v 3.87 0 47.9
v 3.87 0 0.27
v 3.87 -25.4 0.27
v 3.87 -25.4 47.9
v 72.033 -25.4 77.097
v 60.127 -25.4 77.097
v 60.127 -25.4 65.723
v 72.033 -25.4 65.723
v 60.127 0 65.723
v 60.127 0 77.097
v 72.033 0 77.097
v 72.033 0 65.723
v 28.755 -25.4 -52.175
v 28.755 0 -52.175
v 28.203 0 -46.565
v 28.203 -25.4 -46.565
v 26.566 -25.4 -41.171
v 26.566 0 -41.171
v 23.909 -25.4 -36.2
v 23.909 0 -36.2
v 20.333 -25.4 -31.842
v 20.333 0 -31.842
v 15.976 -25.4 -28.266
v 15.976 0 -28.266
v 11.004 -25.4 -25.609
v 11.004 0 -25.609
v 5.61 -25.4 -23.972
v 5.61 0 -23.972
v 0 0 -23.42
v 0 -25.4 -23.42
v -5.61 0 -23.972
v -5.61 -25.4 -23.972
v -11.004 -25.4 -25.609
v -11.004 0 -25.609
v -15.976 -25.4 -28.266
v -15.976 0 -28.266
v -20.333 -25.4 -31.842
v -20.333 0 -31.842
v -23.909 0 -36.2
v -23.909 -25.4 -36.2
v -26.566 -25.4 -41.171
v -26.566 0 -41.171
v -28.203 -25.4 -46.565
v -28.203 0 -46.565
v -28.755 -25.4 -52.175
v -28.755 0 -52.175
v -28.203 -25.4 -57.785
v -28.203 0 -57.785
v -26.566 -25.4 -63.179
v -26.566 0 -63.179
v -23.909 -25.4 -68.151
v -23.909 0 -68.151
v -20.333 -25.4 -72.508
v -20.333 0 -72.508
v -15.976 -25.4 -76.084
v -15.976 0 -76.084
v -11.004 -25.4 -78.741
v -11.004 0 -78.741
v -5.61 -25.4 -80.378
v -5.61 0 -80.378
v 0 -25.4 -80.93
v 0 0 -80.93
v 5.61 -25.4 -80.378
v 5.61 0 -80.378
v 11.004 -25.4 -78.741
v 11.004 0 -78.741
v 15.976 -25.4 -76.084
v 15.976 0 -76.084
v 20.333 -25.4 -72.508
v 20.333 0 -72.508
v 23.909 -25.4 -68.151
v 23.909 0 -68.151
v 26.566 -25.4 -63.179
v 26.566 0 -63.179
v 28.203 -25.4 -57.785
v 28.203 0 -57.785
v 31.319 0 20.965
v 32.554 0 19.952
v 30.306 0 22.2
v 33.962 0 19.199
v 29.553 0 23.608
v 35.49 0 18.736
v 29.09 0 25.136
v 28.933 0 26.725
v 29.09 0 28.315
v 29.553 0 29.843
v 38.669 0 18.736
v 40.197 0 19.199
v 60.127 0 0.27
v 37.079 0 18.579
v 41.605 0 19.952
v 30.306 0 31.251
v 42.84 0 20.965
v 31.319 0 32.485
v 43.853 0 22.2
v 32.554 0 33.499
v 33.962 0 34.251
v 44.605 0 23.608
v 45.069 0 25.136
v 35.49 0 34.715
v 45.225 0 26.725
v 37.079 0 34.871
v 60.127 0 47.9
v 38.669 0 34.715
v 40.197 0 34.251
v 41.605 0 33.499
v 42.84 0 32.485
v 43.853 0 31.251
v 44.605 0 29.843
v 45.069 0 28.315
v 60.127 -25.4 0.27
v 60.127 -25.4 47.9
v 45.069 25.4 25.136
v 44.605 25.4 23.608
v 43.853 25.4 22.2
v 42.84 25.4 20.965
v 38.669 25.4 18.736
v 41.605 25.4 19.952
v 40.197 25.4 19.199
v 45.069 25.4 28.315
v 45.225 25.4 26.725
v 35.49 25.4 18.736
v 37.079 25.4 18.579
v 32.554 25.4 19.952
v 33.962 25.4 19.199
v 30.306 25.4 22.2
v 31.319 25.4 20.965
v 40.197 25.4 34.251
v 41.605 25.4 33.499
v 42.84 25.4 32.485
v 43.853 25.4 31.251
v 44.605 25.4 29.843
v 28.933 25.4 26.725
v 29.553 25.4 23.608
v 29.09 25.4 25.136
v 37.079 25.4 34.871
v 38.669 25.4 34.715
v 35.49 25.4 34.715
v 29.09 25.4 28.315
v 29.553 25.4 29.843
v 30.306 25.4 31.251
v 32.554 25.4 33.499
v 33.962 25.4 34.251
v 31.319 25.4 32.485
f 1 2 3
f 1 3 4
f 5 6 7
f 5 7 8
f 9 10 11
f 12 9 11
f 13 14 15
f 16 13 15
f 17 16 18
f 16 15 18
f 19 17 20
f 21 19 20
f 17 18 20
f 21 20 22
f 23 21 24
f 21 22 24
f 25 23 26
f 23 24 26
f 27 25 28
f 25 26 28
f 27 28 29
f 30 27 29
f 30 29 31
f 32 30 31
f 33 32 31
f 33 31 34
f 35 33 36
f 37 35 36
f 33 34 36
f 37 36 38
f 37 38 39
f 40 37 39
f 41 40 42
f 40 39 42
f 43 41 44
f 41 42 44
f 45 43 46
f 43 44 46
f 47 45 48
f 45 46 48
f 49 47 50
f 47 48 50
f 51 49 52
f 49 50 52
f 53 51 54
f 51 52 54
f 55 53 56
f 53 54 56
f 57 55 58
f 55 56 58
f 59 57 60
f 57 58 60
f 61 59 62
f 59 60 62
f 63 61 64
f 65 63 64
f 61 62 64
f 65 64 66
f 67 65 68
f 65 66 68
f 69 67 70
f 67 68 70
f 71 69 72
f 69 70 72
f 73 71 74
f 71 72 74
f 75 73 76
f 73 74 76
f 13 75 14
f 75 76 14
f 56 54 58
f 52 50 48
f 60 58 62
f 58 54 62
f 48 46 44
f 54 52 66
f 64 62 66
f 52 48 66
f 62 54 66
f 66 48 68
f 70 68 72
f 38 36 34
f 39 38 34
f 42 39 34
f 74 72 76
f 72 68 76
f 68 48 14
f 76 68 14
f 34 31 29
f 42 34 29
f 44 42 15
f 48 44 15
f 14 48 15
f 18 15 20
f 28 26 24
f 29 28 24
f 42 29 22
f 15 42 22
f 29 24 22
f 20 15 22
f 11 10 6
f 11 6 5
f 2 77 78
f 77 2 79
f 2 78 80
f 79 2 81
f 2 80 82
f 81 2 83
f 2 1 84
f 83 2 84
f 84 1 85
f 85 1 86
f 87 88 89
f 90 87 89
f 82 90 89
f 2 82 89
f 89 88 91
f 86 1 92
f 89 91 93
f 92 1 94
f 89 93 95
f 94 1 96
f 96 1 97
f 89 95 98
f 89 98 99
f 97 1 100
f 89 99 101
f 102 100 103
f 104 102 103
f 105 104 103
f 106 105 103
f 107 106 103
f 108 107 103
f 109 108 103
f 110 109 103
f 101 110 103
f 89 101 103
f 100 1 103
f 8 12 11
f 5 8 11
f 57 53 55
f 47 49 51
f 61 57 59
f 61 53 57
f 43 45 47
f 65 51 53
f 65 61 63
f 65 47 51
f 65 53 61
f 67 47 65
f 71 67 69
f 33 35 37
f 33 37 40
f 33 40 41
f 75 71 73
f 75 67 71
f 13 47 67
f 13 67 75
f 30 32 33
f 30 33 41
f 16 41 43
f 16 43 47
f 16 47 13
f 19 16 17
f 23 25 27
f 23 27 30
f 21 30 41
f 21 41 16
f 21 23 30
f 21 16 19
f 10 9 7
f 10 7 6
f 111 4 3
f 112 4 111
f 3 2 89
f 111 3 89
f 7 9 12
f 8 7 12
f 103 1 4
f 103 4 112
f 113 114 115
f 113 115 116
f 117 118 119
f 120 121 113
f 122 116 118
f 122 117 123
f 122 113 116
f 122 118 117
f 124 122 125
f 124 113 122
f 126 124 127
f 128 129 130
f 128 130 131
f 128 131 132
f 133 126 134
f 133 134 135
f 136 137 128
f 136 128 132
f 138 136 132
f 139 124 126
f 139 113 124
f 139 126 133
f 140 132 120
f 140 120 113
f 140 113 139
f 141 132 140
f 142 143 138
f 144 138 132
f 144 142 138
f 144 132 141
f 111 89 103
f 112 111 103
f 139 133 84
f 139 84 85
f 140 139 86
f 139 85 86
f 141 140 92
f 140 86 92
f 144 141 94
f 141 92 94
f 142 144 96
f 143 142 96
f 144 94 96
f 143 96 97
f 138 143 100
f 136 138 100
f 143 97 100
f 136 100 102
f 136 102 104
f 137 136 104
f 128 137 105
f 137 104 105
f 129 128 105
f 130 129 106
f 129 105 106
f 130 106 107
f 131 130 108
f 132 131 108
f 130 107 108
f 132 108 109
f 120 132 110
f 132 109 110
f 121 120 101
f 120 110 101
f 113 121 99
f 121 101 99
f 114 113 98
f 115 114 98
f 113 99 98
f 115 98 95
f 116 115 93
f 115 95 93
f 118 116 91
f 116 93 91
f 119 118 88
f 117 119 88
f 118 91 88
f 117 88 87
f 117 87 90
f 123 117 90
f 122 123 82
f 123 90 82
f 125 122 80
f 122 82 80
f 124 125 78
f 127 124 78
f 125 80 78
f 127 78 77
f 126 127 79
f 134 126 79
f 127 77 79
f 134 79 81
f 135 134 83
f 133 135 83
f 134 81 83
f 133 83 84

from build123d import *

# Parameters (mm, degrees)
F0_W     = 11.906259
F0_H     = 11.374541
F0_W_2   = 56.257025
F0_H_2   = 47.629695
F1_DEPTH = 25.4
F2_R     = 8.14605
F3_DEPTH = 25.4
F5_R     = 28.755201
F6_DEPTH = 25.4


with BuildPart() as f1:
    # F0 (on Front) → F1 (new body)
    with BuildSketch(Plane.XZ):
        with Locations((66.079702, 71.41016)):
            Rectangle(F0_W, F0_H)
        with Locations((31.998061, 24.085229)):
            Rectangle(F0_W_2, F0_H_2)
    extrude(amount=F1_DEPTH)

    # F2 (on face) → F3 (join)
    with BuildSketch(Plane(origin=(0, 0, 0), x_dir=(-1, 0, 0), z_dir=(0, 1, 0))):
        with Locations((-37.079394, 26.725367)):
            Circle(F2_R)
    extrude(amount=F3_DEPTH)


with BuildPart() as f6:
    # F5 (on Front) → F6 (new body)
    with BuildSketch(Plane.XZ):
        with Locations((0, -52.175067)):
            Circle(F5_R)
    extrude(amount=F6_DEPTH)


solid = Compound([f1.part, f6.part])
